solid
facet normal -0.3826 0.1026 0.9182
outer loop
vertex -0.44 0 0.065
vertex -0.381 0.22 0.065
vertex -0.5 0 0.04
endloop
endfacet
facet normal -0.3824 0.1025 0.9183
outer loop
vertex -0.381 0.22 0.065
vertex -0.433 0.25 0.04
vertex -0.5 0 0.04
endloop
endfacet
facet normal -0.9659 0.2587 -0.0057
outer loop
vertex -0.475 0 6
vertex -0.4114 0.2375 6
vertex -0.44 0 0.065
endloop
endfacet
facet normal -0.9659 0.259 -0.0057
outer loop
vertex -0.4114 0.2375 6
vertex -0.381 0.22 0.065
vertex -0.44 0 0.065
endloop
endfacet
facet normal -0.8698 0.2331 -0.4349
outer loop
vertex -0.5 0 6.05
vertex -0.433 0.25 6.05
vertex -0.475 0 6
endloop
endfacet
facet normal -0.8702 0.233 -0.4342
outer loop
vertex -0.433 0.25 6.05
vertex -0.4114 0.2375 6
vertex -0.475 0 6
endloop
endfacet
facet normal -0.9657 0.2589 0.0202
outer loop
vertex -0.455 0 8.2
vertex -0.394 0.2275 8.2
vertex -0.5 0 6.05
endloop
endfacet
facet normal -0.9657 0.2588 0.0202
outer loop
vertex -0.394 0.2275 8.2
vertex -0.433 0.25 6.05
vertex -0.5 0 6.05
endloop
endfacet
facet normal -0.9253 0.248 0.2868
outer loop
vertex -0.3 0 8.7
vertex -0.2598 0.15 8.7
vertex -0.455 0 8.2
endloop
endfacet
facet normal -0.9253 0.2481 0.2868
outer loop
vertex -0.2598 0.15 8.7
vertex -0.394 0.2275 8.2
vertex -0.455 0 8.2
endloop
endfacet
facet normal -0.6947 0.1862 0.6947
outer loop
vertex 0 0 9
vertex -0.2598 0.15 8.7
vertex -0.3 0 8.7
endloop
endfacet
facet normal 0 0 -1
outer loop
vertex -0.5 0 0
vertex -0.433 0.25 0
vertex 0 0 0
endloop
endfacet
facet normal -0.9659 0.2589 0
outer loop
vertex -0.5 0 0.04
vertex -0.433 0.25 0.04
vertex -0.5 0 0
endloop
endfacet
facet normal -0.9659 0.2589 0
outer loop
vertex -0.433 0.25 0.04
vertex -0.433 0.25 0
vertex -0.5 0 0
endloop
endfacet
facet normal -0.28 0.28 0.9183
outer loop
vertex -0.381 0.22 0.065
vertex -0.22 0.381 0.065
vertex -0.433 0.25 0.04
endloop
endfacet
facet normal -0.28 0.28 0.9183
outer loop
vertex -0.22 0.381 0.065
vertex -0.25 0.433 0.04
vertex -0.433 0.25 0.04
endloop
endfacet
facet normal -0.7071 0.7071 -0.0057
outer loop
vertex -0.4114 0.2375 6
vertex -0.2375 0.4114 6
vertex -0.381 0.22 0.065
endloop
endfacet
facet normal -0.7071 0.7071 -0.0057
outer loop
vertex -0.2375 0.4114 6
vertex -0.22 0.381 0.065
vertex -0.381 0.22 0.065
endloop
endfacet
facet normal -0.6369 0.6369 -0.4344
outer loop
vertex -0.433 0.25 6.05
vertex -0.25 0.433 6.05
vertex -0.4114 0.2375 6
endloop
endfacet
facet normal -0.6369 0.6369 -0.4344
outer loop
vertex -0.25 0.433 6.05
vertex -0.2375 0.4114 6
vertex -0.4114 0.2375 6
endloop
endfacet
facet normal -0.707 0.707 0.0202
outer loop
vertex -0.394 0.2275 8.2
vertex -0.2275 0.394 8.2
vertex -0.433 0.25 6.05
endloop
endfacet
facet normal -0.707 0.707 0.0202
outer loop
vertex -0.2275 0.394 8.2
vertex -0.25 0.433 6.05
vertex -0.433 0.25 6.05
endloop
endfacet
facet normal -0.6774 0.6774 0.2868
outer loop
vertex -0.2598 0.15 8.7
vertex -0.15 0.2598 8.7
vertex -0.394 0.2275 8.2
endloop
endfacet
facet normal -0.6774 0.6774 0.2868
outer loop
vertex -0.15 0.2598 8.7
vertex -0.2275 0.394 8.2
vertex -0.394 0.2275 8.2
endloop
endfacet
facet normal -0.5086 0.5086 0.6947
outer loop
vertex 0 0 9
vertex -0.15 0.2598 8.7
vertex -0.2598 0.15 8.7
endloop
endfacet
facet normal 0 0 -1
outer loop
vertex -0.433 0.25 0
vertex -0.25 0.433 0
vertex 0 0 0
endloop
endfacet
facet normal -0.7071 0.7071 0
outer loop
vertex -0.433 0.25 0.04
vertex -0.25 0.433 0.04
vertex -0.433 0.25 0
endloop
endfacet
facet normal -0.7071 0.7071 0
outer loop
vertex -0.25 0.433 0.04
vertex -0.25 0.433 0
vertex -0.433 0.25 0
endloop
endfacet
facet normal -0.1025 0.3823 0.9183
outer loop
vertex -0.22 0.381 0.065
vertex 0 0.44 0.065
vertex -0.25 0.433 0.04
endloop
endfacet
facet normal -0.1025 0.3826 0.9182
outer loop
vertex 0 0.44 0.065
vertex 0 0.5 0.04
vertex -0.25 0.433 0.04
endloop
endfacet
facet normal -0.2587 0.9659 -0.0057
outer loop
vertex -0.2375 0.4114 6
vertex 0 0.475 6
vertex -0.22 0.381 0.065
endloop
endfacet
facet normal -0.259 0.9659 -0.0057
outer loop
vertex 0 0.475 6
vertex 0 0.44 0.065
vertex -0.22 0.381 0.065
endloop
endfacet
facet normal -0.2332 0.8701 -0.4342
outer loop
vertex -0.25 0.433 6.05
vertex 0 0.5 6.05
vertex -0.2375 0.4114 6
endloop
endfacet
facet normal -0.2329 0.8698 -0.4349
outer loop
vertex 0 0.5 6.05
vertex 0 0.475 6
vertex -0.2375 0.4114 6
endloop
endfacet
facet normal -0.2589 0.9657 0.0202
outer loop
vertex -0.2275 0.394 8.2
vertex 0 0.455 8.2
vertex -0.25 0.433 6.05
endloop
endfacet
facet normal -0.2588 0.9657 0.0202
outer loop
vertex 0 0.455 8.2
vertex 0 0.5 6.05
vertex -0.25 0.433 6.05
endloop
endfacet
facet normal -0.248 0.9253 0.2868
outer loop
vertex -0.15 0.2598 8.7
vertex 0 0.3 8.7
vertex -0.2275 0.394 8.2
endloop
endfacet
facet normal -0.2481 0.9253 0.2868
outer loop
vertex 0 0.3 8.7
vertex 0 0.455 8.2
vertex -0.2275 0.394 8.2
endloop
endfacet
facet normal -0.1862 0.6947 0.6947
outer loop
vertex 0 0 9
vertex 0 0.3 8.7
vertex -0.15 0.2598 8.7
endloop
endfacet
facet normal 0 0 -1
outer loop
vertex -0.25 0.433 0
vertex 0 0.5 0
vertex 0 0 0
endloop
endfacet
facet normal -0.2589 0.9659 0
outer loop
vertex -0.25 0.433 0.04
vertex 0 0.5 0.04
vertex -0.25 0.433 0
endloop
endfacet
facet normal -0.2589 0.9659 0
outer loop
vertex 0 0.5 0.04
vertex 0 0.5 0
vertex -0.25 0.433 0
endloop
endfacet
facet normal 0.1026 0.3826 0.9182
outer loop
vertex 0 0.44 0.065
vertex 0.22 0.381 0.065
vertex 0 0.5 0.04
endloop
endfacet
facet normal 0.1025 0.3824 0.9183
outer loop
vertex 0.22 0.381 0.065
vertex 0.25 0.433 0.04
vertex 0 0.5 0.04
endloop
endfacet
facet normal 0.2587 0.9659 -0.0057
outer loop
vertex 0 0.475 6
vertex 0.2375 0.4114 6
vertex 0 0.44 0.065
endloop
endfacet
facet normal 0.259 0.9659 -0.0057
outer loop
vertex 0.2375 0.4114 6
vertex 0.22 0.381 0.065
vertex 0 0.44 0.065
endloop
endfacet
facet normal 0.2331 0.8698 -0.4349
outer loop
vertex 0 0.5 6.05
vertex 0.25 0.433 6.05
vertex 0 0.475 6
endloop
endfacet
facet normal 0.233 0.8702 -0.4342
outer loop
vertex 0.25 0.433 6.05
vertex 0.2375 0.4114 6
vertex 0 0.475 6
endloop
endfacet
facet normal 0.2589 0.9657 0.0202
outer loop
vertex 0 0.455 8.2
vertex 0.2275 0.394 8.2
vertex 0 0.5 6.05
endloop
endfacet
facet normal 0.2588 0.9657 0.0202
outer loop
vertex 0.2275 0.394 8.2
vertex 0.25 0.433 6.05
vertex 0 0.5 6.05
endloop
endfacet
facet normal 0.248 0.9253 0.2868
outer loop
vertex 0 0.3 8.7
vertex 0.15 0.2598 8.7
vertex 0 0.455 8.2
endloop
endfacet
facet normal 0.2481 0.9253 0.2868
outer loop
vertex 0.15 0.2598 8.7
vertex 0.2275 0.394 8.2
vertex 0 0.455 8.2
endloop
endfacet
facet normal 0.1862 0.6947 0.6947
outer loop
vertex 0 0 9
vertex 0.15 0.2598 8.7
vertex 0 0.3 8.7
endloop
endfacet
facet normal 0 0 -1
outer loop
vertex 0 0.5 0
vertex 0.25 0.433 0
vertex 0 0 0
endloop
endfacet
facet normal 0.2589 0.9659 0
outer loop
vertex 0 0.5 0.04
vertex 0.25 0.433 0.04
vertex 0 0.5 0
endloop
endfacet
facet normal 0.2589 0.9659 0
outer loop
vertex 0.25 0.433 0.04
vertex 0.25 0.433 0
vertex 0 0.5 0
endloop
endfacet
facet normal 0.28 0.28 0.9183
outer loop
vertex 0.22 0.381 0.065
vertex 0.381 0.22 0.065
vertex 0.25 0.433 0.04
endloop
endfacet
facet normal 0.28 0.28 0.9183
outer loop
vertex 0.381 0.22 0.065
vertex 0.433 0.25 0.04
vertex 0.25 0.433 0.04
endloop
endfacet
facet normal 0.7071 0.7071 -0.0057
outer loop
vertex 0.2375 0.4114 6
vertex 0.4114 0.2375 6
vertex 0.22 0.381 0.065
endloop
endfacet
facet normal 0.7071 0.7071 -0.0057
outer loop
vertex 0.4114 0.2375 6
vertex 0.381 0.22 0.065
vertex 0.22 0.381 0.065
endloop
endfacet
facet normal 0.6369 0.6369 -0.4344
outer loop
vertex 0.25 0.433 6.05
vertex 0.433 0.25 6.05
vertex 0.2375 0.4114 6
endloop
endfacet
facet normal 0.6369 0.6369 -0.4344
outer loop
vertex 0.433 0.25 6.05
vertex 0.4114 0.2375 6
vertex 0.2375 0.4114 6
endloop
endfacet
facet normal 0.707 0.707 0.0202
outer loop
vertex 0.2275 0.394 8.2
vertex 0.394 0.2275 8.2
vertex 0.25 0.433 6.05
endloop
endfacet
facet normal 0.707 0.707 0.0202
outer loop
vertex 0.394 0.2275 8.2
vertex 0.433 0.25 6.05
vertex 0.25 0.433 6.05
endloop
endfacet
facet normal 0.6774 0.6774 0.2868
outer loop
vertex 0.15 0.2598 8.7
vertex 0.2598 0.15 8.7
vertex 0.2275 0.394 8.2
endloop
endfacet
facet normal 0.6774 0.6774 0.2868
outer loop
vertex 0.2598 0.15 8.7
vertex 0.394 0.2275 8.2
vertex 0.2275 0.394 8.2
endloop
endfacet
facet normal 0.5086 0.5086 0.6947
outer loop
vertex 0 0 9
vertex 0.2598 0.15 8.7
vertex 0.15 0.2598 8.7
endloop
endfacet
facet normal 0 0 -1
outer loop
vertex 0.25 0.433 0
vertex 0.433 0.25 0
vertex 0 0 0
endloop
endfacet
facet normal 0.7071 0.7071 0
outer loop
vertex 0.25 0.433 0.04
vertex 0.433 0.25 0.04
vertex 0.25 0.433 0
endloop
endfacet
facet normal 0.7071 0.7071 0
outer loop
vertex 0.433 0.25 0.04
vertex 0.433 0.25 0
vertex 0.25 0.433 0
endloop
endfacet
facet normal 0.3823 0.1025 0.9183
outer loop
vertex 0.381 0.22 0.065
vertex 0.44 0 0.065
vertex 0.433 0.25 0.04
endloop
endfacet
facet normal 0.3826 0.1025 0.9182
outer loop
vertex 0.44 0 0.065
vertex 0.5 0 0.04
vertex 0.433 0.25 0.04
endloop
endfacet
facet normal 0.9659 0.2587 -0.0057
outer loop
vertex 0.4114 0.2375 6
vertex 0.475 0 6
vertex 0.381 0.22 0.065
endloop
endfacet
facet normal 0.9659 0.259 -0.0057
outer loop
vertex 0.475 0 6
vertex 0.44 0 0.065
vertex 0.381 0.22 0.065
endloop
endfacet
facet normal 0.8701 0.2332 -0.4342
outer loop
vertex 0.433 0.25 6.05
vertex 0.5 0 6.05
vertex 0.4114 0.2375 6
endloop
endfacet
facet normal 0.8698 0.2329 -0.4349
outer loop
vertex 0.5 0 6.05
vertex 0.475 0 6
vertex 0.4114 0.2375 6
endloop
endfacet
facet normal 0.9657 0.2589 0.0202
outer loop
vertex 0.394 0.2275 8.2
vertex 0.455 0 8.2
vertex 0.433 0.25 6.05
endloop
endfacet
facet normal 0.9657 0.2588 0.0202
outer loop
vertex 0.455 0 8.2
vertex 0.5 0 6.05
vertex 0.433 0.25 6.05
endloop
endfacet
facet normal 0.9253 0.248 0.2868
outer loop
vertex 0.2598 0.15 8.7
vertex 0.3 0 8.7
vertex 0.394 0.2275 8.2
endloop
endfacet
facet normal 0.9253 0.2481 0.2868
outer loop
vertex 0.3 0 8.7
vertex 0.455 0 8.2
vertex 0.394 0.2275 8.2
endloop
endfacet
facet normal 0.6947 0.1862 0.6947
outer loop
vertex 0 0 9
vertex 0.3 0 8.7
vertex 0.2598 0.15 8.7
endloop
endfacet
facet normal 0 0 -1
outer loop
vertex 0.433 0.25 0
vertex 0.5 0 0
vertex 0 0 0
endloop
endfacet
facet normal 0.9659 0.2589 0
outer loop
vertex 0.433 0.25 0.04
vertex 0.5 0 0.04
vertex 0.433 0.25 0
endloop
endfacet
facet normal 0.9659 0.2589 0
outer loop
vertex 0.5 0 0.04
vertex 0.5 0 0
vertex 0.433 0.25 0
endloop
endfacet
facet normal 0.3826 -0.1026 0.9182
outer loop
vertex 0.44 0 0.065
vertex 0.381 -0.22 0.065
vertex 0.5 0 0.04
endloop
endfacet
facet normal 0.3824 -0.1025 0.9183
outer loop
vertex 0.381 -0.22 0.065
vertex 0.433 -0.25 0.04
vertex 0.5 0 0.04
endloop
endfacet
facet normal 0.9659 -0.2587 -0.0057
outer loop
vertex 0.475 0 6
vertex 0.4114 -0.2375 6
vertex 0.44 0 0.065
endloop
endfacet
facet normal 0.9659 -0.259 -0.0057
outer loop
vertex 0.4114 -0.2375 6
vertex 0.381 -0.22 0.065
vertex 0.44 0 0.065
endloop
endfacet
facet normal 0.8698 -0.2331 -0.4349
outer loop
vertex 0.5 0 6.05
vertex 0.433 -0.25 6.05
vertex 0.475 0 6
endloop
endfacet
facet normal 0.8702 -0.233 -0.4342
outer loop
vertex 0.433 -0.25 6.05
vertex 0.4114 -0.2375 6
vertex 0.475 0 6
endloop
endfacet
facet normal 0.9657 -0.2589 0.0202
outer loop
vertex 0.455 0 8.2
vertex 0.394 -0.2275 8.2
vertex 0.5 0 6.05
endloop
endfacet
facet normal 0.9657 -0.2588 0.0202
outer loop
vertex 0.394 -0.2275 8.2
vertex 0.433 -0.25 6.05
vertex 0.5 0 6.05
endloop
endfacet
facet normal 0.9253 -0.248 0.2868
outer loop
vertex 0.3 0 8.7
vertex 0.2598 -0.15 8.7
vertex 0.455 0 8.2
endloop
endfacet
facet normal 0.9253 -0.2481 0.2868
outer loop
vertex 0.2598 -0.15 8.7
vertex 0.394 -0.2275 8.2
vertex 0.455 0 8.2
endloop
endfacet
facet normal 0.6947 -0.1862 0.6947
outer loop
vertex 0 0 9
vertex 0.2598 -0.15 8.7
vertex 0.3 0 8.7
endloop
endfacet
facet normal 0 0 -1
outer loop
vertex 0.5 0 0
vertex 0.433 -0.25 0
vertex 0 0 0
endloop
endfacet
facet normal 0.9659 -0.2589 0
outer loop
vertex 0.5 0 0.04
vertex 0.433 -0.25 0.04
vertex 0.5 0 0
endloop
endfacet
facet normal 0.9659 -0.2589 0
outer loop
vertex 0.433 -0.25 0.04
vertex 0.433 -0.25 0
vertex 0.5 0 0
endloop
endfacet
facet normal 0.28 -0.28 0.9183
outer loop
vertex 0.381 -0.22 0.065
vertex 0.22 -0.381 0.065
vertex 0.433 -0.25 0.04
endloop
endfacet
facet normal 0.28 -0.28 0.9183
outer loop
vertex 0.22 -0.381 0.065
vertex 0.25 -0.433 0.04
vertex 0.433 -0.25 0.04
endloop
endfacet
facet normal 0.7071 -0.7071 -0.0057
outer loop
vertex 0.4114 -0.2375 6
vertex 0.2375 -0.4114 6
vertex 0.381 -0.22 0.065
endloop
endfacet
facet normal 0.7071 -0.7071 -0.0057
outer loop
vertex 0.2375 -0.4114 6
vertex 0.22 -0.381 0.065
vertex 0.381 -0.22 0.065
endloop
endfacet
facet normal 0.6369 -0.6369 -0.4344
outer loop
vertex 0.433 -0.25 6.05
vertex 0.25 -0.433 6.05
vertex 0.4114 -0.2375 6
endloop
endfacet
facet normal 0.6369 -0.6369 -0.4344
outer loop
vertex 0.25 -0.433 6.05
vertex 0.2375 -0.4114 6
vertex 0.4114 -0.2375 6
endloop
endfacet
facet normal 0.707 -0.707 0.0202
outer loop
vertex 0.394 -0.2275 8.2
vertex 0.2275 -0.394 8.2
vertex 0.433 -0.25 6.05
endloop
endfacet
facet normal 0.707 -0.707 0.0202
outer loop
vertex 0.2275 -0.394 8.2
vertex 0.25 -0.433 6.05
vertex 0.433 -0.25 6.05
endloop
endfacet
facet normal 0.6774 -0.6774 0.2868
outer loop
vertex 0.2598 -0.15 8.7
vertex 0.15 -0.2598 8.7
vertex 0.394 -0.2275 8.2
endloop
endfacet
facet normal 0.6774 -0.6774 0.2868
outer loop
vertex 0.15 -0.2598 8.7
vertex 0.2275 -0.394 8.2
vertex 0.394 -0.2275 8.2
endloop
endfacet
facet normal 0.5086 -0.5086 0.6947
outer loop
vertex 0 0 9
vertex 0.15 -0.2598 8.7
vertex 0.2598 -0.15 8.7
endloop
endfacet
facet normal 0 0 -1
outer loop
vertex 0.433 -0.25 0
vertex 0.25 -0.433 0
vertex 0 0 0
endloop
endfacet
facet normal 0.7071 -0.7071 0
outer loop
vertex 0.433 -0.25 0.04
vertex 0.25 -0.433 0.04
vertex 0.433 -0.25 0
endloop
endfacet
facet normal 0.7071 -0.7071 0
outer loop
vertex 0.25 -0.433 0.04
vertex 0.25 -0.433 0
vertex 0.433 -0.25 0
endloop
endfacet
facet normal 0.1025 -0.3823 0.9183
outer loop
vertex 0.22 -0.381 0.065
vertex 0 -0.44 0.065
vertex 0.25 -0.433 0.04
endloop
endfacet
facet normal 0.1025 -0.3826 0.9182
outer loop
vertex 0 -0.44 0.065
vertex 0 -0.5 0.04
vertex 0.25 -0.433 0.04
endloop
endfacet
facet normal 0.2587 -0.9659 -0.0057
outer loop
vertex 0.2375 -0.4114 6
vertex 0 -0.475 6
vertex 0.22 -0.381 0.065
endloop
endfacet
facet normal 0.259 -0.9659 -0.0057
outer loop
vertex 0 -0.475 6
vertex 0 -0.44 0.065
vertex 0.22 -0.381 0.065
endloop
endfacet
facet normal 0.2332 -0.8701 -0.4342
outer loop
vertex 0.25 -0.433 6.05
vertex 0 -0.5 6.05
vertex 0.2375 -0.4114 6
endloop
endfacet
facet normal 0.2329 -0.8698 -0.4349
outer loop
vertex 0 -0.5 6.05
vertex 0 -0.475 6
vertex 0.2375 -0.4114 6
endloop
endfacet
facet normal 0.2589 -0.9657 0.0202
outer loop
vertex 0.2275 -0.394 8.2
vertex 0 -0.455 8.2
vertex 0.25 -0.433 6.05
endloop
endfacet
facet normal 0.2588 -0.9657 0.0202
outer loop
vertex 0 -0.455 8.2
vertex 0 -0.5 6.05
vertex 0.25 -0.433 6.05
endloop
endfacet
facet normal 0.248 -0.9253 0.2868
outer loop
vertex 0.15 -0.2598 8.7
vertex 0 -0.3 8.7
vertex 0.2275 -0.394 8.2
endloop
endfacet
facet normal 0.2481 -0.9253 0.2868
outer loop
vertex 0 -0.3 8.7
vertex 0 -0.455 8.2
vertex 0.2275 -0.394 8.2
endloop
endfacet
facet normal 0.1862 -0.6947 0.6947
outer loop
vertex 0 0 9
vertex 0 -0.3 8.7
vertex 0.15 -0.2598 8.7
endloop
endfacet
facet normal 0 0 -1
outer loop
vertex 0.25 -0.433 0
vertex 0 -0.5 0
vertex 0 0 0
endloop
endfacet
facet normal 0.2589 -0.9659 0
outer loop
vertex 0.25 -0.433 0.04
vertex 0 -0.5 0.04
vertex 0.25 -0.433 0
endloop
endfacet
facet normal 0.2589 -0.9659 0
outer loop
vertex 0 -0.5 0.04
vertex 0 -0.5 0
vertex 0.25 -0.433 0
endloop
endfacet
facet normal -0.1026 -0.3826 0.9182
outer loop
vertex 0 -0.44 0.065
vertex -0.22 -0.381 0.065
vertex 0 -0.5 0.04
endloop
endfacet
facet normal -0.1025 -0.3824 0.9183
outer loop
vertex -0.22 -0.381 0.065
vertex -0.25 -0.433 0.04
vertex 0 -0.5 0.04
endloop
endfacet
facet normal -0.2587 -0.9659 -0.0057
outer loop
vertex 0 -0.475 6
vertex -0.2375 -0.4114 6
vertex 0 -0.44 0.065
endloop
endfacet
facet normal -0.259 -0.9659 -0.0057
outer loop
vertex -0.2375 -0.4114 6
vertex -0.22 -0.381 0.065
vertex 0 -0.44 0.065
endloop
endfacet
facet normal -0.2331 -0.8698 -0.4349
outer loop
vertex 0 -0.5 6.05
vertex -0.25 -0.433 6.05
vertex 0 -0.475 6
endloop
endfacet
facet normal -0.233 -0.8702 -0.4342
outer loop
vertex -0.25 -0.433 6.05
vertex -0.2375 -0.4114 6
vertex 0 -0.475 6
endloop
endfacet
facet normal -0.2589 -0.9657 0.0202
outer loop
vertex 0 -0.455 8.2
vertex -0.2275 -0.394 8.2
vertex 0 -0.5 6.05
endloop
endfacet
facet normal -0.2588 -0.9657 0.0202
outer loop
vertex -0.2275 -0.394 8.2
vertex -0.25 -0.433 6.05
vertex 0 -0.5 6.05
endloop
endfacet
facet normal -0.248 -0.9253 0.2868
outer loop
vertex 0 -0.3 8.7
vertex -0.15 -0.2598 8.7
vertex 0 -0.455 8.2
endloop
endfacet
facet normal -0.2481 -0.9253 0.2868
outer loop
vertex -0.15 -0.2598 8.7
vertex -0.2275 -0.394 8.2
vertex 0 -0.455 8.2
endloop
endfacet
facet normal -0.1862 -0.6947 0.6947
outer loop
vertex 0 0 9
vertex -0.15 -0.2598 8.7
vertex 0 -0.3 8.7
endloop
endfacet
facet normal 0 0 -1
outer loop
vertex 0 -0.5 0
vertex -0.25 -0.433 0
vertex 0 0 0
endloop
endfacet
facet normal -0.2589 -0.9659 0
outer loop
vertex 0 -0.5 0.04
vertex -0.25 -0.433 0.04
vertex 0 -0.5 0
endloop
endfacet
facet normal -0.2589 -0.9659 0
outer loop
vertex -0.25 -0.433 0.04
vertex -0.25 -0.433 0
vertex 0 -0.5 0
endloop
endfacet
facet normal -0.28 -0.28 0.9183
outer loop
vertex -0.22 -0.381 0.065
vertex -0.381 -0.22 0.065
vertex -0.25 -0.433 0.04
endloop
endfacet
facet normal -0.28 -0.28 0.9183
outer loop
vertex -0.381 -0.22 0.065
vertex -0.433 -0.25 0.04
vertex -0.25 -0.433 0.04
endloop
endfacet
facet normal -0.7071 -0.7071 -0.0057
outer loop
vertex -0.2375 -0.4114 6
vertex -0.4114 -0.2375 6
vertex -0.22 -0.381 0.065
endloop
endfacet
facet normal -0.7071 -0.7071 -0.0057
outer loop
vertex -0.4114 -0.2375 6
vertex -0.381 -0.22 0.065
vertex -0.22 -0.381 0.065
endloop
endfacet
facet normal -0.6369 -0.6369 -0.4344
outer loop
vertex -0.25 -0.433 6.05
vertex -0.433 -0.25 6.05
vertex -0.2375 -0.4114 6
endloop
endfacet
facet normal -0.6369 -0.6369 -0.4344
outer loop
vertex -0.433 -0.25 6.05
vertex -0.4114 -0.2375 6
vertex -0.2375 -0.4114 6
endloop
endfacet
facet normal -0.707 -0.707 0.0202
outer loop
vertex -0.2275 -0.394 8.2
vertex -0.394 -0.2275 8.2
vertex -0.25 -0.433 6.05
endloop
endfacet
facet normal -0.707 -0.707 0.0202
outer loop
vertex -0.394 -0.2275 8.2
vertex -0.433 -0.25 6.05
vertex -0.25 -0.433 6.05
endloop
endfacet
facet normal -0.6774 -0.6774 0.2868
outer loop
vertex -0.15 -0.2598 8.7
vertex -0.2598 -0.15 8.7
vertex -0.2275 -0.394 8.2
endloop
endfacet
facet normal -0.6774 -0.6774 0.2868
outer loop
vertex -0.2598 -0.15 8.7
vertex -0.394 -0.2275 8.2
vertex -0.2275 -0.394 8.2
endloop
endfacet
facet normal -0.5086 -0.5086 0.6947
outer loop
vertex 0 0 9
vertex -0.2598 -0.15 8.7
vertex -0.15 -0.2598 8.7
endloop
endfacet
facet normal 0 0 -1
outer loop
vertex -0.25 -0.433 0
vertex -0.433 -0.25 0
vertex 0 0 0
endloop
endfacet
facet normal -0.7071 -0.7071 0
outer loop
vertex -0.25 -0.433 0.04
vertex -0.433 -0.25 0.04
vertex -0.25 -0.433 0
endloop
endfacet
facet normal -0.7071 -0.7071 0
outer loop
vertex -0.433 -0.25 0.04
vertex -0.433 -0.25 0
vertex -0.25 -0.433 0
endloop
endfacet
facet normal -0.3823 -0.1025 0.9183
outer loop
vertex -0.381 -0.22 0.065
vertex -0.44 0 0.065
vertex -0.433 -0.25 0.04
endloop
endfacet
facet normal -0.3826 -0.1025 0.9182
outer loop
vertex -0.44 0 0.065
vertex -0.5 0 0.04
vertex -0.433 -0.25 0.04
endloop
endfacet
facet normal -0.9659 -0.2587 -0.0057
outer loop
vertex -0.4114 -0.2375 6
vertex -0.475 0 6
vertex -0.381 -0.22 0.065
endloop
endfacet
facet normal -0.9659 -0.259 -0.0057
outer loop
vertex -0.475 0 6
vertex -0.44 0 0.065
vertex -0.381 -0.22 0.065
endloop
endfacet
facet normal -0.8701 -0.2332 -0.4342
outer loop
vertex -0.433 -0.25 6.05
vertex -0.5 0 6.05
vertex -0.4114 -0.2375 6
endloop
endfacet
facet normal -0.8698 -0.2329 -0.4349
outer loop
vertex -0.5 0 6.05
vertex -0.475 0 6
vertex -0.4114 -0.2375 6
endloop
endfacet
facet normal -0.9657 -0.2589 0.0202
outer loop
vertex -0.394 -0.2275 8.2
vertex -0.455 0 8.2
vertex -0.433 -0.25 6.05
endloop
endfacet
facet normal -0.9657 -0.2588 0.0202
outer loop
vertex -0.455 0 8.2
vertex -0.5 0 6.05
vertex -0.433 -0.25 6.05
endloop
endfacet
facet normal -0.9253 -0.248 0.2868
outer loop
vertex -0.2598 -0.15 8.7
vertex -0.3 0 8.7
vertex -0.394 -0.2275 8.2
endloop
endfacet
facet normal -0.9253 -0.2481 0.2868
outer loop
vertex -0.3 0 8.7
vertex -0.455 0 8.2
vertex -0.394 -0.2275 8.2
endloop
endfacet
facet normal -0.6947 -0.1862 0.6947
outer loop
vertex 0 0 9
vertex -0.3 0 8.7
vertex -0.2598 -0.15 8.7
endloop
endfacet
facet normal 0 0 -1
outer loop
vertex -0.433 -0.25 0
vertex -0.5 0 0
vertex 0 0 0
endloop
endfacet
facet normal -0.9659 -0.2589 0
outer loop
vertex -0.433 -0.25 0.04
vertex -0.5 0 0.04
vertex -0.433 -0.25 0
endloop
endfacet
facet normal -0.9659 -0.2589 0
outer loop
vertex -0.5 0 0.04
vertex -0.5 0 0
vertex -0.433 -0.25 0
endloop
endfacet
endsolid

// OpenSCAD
// Carousel Autoloader 0.2.23 - complete round on unit calibre (d = 1).
// Base (case rim) at z = 0, nose at z = C0 + P0. The axis is the gun axis (+z = nose = toward the gun).
// Canonical case length C0 = 6 and projectile length P0 = 3. The C# geometry stretches only
// the two plain zones (case body and projectile body) to the true case/projectile lengths, so the
// rim, groove, driving band and ogive keep their calibre proportions. Zone limits are mirrored in
// AutoloaderModelGeometry.RoundZones; a test checks the embedded data against this export.
//   A [0, 0.065]            rim (hulsrand) + extraction groove (groef)      fixed
//   B [0.065, C0]           case body                                       stretched to the charge length
//   C [C0, C0 + 0.05]       driving band (geleideband)                      fixed
//   D [C0 + 0.05, C0+P0-0.8] projectile body                                stretched to the projectile length
//   E [C0+P0-0.8, C0+P0]    ogive (neus/ogief) and tip                      fixed
// The widest rings (rim, band) have radius 0.5 exactly, with a vertex on the x and y axes, so the
// bounding box of every round is exactly the packer diameter.
C0 = 6; P0 = 3;
fn = 12;      // 12 (fine) or 8 (medium); -D fn=8 for the medium level
coarse = 0;   // 1: six-point profile for very full racks
fine_profile = [[0,0],[0.5,0],[0.5,0.04],[0.44,0.065],[0.475,C0],[0.5,C0+0.05],
                [0.455,C0+P0-0.8],[0.30,C0+P0-0.3],[0,C0+P0]];
coarse_profile = [[0,0],[0.5,0],[0.46,0.065],[0.475,C0],[0.47,C0+P0-0.8],[0,C0+P0]];
rotate_extrude($fn = fn) polygon(coarse == 1 ? coarse_profile : fine_profile);
